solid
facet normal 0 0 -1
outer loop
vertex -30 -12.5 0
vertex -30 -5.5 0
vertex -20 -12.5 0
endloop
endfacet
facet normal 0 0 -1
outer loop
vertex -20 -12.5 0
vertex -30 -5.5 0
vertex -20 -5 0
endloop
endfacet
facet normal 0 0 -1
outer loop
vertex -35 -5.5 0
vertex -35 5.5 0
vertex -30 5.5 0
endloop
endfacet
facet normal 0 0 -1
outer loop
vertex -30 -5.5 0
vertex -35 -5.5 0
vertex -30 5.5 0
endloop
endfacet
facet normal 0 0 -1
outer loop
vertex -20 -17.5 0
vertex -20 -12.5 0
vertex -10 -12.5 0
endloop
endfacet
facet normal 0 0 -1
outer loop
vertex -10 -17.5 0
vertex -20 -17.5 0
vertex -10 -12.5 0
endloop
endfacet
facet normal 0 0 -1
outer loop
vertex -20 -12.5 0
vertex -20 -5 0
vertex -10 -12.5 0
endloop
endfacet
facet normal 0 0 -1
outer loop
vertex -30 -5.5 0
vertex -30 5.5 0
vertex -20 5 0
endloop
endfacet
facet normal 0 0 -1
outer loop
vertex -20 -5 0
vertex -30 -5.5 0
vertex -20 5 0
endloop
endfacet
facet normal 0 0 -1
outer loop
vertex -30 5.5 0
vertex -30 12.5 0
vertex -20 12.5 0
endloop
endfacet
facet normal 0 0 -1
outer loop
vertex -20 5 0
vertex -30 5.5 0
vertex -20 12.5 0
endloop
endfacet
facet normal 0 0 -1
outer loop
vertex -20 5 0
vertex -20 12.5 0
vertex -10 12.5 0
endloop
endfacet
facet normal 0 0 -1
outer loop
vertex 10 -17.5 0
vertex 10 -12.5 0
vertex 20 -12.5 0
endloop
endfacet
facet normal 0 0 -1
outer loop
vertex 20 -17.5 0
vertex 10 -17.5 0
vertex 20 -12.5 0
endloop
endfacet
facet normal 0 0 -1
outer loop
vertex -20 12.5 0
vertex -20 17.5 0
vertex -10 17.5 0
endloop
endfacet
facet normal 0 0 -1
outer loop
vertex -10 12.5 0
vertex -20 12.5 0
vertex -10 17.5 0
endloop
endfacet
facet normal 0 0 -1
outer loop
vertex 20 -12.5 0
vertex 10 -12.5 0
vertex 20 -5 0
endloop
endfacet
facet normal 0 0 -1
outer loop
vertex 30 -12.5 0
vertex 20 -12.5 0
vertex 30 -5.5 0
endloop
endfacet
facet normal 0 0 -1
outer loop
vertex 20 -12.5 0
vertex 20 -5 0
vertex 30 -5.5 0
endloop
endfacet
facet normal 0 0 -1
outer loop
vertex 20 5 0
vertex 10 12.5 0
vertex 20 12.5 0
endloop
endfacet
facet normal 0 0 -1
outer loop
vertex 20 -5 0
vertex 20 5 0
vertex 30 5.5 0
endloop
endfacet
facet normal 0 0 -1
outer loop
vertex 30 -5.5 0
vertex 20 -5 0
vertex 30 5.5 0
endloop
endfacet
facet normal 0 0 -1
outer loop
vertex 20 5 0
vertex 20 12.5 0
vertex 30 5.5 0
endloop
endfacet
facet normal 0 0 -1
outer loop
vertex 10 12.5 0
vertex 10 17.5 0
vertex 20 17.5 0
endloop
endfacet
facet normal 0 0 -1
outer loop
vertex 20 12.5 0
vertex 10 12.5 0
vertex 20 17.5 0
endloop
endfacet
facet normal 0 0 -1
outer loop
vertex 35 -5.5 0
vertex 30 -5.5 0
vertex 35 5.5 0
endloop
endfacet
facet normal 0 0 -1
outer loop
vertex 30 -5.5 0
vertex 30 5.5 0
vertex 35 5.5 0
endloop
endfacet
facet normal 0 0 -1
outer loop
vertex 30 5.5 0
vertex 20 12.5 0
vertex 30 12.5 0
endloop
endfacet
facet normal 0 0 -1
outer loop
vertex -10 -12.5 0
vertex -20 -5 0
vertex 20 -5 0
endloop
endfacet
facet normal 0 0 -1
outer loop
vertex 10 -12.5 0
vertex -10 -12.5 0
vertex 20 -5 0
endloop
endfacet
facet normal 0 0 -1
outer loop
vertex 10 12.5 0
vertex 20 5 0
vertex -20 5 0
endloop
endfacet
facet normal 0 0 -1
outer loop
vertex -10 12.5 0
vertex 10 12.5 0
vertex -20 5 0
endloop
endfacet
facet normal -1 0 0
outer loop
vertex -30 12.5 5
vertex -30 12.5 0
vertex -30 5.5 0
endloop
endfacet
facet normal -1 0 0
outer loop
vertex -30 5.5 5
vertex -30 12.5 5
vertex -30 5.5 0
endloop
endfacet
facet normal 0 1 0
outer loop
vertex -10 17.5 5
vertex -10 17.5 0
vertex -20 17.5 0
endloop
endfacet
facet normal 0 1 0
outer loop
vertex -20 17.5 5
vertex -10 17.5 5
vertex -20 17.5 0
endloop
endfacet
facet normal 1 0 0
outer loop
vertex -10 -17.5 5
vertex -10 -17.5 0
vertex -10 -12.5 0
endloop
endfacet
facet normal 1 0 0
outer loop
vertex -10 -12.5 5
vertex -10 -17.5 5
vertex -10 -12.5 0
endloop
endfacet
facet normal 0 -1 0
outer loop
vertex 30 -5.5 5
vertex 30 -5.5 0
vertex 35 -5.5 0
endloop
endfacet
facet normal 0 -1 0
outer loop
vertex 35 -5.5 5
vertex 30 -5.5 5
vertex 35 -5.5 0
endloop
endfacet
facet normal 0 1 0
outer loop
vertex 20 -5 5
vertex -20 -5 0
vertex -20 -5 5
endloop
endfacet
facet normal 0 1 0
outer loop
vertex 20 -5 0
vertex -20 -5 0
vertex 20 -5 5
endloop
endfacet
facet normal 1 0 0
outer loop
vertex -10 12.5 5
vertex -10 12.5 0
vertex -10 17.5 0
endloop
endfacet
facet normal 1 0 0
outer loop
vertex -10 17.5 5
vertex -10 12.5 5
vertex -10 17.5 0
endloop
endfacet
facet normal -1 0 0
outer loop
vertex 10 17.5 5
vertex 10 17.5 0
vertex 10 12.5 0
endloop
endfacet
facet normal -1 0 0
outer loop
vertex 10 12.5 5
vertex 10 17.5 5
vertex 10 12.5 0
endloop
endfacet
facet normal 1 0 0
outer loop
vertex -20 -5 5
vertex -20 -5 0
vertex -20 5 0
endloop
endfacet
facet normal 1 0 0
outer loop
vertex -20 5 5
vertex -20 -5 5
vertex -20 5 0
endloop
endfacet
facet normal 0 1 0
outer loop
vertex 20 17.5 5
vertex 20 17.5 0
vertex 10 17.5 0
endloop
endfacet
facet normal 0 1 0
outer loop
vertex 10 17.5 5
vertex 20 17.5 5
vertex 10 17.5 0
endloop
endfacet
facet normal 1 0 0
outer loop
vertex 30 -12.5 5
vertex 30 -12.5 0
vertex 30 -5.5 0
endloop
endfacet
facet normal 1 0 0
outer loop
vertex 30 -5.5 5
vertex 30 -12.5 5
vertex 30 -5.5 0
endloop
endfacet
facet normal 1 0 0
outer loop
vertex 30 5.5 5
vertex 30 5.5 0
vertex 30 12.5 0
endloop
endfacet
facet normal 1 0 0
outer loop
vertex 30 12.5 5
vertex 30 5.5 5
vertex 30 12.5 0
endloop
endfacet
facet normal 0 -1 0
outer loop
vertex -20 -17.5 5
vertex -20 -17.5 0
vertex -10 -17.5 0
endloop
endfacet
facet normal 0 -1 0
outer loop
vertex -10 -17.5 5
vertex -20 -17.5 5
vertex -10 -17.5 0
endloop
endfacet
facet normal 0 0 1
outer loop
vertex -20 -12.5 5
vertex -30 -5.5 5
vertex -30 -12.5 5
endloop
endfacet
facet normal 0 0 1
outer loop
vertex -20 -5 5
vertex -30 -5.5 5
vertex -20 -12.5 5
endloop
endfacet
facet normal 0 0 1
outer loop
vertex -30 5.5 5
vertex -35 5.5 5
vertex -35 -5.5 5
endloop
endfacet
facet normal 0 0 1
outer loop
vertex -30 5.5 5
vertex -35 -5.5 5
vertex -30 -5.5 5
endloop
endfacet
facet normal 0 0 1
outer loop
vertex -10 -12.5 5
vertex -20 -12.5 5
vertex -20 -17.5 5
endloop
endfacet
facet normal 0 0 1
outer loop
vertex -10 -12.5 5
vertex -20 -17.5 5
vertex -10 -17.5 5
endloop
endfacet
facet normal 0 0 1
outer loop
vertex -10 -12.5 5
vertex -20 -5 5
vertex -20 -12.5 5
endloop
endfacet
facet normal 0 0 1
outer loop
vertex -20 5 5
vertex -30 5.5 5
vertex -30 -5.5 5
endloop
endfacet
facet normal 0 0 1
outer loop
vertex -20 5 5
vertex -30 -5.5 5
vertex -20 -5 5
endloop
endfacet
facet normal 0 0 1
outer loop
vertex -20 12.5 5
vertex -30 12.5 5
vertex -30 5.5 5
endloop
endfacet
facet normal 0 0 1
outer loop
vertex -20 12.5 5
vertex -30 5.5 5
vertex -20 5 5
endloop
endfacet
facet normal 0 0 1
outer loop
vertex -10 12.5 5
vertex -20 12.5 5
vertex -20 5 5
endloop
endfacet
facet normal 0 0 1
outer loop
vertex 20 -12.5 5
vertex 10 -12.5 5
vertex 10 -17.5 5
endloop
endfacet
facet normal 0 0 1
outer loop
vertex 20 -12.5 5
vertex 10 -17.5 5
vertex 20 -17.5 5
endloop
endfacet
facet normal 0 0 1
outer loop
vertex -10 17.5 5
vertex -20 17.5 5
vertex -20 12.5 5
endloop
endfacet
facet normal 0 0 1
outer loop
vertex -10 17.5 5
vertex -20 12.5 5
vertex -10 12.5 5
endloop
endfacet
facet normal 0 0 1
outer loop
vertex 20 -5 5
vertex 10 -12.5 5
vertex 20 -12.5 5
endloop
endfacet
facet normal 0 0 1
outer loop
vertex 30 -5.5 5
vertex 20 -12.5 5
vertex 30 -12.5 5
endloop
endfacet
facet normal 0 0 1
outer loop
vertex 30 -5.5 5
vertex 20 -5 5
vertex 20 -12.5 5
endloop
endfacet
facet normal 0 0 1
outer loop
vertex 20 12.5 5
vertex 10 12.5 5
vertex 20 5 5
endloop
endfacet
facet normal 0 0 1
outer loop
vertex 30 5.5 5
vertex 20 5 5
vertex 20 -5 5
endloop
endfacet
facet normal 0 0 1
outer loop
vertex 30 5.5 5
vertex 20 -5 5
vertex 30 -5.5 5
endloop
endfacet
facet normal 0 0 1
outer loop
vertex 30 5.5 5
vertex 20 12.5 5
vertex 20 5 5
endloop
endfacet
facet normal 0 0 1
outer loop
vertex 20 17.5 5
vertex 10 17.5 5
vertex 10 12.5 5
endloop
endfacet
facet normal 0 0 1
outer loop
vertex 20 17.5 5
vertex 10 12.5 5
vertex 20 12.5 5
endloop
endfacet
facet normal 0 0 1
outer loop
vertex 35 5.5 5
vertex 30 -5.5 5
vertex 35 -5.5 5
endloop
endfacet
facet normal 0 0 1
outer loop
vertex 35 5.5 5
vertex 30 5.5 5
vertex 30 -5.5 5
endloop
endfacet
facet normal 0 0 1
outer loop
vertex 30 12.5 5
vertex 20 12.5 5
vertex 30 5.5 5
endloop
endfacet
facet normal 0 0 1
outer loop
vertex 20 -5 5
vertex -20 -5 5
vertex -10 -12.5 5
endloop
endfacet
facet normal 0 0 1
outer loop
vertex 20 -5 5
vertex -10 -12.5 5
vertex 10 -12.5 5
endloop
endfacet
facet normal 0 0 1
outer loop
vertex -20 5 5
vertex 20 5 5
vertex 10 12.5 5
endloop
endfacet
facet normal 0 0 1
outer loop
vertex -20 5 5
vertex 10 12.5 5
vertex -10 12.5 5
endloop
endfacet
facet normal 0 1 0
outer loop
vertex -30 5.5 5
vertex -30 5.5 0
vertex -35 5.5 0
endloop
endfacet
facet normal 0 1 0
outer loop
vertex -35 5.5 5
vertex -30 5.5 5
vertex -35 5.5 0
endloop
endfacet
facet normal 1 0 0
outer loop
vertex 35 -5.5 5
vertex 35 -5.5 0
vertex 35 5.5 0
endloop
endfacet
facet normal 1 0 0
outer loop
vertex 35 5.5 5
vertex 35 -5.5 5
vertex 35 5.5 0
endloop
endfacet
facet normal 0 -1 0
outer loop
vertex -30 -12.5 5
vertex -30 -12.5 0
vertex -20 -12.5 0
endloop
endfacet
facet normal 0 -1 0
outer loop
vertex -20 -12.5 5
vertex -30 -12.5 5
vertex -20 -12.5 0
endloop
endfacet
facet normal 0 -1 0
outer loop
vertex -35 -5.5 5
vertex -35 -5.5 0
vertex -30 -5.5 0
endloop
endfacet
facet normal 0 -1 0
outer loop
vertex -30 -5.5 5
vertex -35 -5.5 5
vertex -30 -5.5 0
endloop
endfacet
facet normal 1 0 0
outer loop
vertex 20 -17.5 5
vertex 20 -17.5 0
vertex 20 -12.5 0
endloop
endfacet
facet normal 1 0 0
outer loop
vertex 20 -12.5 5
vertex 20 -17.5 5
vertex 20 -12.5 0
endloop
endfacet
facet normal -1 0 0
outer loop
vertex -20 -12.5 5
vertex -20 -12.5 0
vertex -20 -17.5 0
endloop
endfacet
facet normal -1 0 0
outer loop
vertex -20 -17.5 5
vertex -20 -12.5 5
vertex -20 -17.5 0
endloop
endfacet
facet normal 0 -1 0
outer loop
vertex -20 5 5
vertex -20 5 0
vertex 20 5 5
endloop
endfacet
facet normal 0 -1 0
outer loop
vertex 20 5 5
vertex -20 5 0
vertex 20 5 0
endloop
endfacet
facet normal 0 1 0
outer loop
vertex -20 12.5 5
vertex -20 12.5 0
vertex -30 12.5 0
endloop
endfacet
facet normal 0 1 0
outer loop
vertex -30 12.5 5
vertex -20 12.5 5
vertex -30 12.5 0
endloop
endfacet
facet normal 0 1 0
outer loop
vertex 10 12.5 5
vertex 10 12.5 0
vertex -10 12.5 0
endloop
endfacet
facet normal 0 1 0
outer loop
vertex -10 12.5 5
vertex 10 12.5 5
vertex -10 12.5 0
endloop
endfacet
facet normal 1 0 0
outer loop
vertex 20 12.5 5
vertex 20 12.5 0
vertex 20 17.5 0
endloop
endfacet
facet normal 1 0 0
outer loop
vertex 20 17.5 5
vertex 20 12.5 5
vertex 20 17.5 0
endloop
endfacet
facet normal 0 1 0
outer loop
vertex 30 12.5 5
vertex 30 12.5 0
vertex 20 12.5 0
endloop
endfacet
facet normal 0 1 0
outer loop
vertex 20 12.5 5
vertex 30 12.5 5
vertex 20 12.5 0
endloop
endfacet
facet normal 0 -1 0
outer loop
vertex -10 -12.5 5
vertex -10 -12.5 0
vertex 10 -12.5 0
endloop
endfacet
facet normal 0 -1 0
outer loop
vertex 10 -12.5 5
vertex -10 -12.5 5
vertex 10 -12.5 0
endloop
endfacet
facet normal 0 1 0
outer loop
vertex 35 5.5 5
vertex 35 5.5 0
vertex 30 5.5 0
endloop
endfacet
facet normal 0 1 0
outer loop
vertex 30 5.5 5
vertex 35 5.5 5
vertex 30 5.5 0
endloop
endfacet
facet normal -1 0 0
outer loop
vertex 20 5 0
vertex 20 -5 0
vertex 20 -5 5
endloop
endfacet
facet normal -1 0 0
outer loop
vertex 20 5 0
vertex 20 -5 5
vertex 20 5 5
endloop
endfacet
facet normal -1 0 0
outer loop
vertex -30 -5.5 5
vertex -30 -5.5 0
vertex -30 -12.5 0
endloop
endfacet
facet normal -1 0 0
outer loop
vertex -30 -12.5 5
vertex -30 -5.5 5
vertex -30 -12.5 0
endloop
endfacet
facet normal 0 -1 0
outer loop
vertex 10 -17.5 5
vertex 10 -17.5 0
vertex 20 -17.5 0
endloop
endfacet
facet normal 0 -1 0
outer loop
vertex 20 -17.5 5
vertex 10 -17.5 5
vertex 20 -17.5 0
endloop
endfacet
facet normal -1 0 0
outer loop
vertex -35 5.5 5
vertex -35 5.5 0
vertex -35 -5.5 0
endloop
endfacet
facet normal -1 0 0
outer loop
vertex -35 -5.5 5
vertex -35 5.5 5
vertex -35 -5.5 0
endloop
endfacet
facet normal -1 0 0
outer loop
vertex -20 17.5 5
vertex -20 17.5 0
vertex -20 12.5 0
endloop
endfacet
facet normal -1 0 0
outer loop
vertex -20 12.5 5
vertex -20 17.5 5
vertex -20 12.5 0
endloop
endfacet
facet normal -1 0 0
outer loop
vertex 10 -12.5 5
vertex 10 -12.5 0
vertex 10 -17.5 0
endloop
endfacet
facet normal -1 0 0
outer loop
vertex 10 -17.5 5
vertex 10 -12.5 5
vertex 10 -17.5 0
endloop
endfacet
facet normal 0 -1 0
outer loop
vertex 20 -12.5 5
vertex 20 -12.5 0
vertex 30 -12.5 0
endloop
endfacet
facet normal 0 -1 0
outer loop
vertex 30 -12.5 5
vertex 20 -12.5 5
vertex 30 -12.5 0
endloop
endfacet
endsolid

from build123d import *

# Parameters (mm, degrees)
SKETCH1_W           = 40
SKETCH1_H           = 10
BOSS_EXTRUDE1_DEPTH = 5


with BuildPart() as part:
    # Sketch1 → Boss-Extrude1 (new body)
    with BuildSketch(Plane.XY):
        Polygon((-30, -12.5), (-20, -12.5), (-20, -17.5), (-10, -17.5), (-10, -12.5), (10, -12.5), (10, -17.5), (20, -17.5), (20, -12.5), (30, -12.5), (30, -5.5), (35, -5.5), (35, 5.5), (30, 5.5), (30, 12.5), (20, 12.5), (20, 17.5), (10, 17.5), (10, 12.5), (-10, 12.5), (-10, 17.5), (-20, 17.5), (-20, 12.5), (-30, 12.5), (-30, 5.5), (-35, 5.5), (-35, -5.5), (-30, -5.5), align=None)
        Rectangle(SKETCH1_W, SKETCH1_H, mode=Mode.SUBTRACT)
    extrude(amount=BOSS_EXTRUDE1_DEPTH)


solid = part.part
